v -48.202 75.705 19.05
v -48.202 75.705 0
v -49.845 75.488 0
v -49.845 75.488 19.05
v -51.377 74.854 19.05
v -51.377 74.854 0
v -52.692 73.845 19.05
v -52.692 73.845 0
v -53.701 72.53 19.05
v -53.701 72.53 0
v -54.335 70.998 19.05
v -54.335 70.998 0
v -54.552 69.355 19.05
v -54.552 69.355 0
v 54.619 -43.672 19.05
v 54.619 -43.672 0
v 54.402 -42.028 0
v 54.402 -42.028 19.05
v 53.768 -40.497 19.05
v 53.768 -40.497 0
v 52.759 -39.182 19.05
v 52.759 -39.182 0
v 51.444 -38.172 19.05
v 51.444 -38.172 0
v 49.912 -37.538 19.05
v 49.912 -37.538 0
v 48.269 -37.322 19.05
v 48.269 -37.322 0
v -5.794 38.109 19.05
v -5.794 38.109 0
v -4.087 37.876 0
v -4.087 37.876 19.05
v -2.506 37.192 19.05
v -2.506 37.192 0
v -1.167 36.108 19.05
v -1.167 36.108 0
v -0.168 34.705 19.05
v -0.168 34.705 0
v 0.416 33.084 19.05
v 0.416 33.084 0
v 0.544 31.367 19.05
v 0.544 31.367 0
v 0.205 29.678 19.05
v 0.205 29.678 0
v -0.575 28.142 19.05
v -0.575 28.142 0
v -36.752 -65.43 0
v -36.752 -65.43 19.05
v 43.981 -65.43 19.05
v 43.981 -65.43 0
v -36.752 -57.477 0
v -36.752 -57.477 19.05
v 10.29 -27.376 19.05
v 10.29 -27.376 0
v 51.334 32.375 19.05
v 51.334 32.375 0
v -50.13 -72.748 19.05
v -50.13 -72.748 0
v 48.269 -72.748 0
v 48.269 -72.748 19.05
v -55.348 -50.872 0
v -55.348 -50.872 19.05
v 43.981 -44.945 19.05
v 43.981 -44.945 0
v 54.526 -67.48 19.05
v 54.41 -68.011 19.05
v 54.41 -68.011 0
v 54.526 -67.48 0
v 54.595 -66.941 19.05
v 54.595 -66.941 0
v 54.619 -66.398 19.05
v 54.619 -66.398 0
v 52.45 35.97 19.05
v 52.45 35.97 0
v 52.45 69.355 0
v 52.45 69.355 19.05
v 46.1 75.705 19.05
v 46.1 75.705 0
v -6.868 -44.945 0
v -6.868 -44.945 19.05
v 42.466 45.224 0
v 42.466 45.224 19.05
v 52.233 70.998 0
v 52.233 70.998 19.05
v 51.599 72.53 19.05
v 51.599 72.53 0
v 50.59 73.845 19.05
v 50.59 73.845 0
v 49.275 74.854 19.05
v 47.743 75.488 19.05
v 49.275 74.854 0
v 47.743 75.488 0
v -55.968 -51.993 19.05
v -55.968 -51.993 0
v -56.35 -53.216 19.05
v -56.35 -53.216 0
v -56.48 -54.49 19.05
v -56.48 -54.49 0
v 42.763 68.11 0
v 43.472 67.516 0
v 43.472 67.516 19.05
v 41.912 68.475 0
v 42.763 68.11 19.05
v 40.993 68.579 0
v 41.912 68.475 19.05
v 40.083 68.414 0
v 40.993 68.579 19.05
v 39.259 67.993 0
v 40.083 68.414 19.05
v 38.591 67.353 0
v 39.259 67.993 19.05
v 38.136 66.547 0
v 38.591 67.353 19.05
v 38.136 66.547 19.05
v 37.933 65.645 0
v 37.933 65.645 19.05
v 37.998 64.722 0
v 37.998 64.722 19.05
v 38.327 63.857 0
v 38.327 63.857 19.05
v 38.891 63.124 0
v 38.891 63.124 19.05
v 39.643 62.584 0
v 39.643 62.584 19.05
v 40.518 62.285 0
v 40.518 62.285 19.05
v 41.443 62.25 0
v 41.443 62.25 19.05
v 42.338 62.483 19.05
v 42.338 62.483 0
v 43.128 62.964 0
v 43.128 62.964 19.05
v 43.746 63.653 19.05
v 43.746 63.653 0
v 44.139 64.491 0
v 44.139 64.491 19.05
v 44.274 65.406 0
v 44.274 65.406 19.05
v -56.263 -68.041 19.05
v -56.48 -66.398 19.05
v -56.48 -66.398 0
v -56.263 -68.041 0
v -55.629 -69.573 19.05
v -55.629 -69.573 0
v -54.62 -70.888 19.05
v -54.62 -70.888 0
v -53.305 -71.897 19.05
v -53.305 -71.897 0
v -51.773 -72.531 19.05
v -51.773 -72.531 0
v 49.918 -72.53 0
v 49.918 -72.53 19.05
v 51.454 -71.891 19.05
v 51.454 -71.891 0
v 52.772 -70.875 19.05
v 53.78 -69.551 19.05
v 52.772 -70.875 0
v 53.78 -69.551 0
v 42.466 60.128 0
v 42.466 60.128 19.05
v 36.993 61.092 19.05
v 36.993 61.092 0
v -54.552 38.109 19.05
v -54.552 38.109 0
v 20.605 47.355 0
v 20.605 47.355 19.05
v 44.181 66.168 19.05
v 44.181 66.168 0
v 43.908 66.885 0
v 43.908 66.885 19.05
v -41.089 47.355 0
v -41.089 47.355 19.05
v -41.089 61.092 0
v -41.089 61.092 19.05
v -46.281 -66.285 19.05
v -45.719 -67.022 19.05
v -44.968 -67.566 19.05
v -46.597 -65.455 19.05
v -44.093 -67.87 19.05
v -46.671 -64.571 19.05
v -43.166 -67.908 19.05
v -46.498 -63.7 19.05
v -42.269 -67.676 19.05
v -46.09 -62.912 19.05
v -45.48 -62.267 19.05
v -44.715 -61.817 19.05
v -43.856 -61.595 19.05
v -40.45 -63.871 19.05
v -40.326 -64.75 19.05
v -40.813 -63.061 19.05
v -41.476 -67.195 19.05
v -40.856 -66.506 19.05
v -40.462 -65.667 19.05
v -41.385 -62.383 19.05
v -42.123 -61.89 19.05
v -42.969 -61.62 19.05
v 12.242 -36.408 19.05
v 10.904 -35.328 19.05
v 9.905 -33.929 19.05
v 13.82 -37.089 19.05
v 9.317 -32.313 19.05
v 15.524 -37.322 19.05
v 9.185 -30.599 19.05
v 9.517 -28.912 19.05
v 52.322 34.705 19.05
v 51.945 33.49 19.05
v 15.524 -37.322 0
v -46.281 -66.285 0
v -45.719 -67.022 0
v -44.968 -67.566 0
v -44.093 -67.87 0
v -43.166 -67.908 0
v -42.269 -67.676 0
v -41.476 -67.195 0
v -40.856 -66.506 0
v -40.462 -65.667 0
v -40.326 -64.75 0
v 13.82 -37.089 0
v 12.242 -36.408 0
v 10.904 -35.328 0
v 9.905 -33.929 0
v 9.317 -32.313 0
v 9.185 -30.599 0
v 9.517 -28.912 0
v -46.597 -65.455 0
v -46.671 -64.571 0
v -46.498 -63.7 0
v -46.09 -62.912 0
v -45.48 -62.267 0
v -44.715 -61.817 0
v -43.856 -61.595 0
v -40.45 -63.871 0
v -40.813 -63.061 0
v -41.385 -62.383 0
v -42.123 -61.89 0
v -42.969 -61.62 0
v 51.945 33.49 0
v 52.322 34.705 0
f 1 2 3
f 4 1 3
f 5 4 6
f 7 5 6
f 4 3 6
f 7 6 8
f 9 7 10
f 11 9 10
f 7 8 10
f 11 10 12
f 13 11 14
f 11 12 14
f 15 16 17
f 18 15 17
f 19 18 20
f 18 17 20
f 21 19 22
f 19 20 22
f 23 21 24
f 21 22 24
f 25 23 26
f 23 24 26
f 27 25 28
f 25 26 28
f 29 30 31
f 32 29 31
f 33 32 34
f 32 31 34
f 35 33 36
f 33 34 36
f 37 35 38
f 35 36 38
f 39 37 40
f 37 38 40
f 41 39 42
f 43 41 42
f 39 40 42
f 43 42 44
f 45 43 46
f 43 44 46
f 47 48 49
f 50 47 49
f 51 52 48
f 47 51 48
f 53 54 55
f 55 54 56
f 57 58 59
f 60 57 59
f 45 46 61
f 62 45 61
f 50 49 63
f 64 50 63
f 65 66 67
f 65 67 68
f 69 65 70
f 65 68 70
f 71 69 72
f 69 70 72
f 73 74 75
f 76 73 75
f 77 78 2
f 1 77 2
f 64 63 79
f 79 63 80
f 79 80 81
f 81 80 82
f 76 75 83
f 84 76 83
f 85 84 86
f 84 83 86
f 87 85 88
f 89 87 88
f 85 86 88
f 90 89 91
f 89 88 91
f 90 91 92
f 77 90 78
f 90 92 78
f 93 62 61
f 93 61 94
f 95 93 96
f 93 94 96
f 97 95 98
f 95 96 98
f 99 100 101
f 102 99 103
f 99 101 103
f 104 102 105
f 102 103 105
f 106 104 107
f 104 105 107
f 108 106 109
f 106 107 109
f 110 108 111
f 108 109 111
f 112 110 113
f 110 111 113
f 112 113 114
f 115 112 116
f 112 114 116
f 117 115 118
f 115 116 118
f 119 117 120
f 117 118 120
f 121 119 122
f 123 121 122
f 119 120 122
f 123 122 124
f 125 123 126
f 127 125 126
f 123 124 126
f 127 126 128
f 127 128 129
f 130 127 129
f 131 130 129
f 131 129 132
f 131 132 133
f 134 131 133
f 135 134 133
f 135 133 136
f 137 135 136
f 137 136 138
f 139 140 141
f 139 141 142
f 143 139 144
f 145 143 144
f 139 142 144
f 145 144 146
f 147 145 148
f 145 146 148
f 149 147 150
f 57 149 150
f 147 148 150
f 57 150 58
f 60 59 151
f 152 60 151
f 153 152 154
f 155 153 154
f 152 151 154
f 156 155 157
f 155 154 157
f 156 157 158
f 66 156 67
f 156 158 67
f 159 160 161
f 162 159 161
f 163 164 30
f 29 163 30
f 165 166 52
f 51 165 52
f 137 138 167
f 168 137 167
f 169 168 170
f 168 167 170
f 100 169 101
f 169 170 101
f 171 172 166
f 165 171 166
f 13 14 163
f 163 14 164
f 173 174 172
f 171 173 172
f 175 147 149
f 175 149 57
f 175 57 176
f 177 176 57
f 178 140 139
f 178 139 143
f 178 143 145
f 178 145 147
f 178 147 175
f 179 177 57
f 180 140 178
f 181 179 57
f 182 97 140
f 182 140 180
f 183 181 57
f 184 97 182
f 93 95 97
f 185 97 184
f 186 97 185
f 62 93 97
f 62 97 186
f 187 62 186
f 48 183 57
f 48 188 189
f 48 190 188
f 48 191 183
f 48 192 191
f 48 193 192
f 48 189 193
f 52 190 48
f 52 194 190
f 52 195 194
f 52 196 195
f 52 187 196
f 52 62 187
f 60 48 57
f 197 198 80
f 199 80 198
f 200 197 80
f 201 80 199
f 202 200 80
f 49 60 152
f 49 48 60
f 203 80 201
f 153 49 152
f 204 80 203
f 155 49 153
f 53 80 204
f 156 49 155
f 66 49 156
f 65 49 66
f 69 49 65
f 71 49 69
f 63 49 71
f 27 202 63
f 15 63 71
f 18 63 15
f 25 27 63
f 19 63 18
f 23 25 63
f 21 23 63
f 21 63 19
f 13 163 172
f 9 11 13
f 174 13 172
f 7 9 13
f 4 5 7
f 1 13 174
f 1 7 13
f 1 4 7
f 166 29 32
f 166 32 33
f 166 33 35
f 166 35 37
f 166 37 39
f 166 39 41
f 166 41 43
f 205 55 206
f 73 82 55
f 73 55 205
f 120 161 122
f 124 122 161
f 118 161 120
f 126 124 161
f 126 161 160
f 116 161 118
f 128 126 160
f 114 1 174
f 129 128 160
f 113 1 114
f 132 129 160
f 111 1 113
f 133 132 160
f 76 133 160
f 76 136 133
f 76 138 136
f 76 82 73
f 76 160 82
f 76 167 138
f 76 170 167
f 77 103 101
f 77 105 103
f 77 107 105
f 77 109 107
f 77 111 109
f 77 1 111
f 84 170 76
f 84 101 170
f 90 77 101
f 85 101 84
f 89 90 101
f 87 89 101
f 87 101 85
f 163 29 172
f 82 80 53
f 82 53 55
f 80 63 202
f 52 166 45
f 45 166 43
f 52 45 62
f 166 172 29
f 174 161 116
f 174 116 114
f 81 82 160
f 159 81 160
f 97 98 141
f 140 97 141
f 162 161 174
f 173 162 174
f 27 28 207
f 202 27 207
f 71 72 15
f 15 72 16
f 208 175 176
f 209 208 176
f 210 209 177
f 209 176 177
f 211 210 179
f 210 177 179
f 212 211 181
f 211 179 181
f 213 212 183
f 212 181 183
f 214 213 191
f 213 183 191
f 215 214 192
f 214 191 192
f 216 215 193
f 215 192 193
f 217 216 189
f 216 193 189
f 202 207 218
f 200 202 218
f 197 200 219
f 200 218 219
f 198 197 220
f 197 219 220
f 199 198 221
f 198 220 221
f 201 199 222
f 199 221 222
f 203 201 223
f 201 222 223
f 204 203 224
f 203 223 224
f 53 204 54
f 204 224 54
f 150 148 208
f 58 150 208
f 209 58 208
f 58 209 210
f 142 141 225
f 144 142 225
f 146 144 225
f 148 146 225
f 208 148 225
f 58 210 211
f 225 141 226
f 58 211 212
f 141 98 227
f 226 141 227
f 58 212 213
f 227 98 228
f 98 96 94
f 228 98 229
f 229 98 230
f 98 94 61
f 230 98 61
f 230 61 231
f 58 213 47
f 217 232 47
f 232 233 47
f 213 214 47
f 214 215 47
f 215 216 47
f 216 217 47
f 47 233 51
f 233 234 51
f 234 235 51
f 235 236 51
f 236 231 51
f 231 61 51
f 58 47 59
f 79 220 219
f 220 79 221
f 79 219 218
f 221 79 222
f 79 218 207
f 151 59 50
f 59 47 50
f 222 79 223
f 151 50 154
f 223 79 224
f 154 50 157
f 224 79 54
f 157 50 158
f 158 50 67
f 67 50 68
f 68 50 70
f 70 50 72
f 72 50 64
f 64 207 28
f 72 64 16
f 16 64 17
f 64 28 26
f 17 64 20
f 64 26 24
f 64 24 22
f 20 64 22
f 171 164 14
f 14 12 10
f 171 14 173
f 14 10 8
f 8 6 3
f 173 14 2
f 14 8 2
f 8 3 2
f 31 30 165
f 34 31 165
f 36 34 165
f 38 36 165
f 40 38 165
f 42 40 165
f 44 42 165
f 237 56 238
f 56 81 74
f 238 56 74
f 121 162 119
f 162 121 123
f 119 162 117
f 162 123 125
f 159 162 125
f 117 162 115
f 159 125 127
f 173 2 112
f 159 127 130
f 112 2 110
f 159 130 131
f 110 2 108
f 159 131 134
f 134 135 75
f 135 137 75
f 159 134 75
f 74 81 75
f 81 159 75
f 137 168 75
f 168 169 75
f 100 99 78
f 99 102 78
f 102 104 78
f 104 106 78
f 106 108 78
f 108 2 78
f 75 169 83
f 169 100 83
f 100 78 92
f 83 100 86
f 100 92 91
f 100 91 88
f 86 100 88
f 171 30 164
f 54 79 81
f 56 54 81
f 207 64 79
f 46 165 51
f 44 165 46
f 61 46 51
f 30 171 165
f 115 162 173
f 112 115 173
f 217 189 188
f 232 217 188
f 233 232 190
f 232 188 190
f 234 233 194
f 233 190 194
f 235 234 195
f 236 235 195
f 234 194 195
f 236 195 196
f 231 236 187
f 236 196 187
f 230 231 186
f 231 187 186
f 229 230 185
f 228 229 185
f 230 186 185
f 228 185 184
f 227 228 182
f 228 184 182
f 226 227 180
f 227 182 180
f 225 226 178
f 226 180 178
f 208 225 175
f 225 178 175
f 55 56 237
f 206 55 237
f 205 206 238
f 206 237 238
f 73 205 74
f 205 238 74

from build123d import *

# Parameters (mm, degrees)
F1_DEPTH = 19.05
F3_DEPTH = 25.4
F5_DEPTH = 19.051


with BuildPart() as f1:
    # F0 (on Top) → F1 (new body)
    with BuildSketch(Plane.XY):
        with BuildLine():
            Line((14.9550589674, 50.2520292753), (-54.5516210822, 50.2520292753))
            Line((-54.5516210822, 50.2520292753), (-54.5516210822, 38.1094498451))
            Line((-54.5516210822, 38.1094498451), (-5.7937513614, 38.1094498451))
            ThreePointArc((-5.7937513614, 38.1094498451), (-0.1681561255, 34.7048153982), (-0.5750318579, 28.1417894487))
            Line((-0.5750318579, 28.1417894487), (-17.6851839396, 3.4592392383))
            Line((-17.6851839396, 3.4592392383), (14.9550589674, 50.2520292753))
        make_face()
        with BuildLine():
            ThreePointArc((-48.2016210822, 75.7045095678), (-52.6917491428, 73.8446376283), (-54.5516210822, 69.3545095678))
            Line((-54.5516210822, 69.3545095678), (-54.5516210822, 50.2520292753))
            Line((-54.5516210822, 50.2520292753), (14.9550589674, 50.2520292753))
            Line((14.9550589674, 50.2520292753), (-17.6851839396, 3.4592392383))
            Line((-17.6851839396, 3.4592392383), (-55.3482900739, -50.8723355951))
            ThreePointArc((-55.3482900739, -50.8723355951), (-56.1901550656, -52.5947874076), (-56.4795705704, -54.4899959914))
            Line((-56.4795705704, -54.4899959914), (-56.4795705704, -66.3977798347))
            ThreePointArc((-56.4795705704, -66.3977798347), (-54.6196986309, -70.8879078953), (-50.1295705704, -72.7477798347))
            Line((-50.1295705704, -72.7477798347), (48.2686518641, -72.7477798347))
            ThreePointArc((48.2686518641, -72.7477798347), (52.1466655513, -71.4260508936), (54.4102909159, -68.0110900211))
            Line((54.4102909159, -68.0110900211), (54.4102909159, -46.6400994718))
            Line((54.4102909159, -46.6400994718), (-18.9196563035, -46.6400994718))
            Line((-18.9196563035, -46.6400994718), (52.4497096213, 55.9125908699))
            Line((52.4497096213, 55.9125908699), (52.4497096213, 69.3545095678))
            ThreePointArc((52.4497096213, 69.3545095678), (50.5898376818, 73.8446376283), (46.0997096213, 75.7045095678))
            Line((46.0997096213, 75.7045095678), (-48.2016210822, 75.7045095678))
        make_face()
        with BuildLine():
            Line((52.4497096213, 35.9703072308), (52.4497096213, 55.9125908699))
            Line((52.4497096213, 55.9125908699), (-18.9196563035, -46.6400994718))
            Line((-18.9196563035, -46.6400994718), (54.4102909159, -46.6400994718))
            Line((54.4102909159, -46.6400994718), (54.4102909159, -68.0110900211))
            ThreePointArc((54.4102909159, -68.0110900211), (54.5663462033, -67.2111346224), (54.6186518641, -66.3977798347))
            Line((54.6186518641, -66.3977798347), (54.6186518641, -43.6716623549))
            ThreePointArc((54.6186518641, -43.6716623549), (52.7587799247, -39.1815342944), (48.2686518641, -37.3216623549))
            Line((48.2686518641, -37.3216623549), (15.5238411508, -37.3216623549))
            ThreePointArc((15.5238411508, -37.3216623549), (9.9045362797, -33.929011297), (10.2897481379, -27.3762805487))
            Line((10.2897481379, -27.3762805487), (51.3338026341, 32.3749254245))
            ThreePointArc((51.3338026341, 32.3749254245), (52.1643196925, 34.0880201421), (52.4497096213, 35.9703072308))
        make_face()
    extrude(amount=F1_DEPTH)

    # F2 (on face) → F3 (cut)
    with BuildSketch(Plane.XY.offset(19.05)):
        with BuildLine():
            ThreePointArc((44.2737464547, 65.4060840012), (44.0664205154, 66.5345943774), (43.4715192615, 67.5157224079))
            ThreePointArc((43.4715192615, 67.5157224079), (38.1310723939, 64.2775736249), (44.2737464547, 65.4060840012))
        make_face()
        with BuildLine():
            ThreePointArc((-40.3262716085, -64.7502714978), (-44.2935384673, -61.6757084029), (-46.2808783641, -66.2846805972))
            ThreePointArc((-46.2808783641, -66.2846805972), (-42.7090047498, -67.8248345927), (-40.3262716085, -64.7502714978))
        make_face()
    extrude(amount=-F3_DEPTH, mode=Mode.SUBTRACT)

    # F4 (on face) → F5 (cut, through all)
    with BuildSketch(Plane.XY.offset(19.05)):
        Polygon((42.4659381227, 60.1279996336), (36.9925759733, 61.0919743776), (-41.0894751549, 61.0919743776), (-41.0894751549, 47.3553165793), (20.6049866974, 47.3553165793), (-36.7515794933, -57.4770644307), (-36.7515794933, -65.4298663139), (43.9813993871, -65.4298663139), (43.9813993871, -44.9453778565), (-6.8683284335, -44.9453778565), (42.4659381227, 45.2243964511), align=None)
    extrude(amount=-F5_DEPTH, mode=Mode.SUBTRACT)


solid = f1.part
